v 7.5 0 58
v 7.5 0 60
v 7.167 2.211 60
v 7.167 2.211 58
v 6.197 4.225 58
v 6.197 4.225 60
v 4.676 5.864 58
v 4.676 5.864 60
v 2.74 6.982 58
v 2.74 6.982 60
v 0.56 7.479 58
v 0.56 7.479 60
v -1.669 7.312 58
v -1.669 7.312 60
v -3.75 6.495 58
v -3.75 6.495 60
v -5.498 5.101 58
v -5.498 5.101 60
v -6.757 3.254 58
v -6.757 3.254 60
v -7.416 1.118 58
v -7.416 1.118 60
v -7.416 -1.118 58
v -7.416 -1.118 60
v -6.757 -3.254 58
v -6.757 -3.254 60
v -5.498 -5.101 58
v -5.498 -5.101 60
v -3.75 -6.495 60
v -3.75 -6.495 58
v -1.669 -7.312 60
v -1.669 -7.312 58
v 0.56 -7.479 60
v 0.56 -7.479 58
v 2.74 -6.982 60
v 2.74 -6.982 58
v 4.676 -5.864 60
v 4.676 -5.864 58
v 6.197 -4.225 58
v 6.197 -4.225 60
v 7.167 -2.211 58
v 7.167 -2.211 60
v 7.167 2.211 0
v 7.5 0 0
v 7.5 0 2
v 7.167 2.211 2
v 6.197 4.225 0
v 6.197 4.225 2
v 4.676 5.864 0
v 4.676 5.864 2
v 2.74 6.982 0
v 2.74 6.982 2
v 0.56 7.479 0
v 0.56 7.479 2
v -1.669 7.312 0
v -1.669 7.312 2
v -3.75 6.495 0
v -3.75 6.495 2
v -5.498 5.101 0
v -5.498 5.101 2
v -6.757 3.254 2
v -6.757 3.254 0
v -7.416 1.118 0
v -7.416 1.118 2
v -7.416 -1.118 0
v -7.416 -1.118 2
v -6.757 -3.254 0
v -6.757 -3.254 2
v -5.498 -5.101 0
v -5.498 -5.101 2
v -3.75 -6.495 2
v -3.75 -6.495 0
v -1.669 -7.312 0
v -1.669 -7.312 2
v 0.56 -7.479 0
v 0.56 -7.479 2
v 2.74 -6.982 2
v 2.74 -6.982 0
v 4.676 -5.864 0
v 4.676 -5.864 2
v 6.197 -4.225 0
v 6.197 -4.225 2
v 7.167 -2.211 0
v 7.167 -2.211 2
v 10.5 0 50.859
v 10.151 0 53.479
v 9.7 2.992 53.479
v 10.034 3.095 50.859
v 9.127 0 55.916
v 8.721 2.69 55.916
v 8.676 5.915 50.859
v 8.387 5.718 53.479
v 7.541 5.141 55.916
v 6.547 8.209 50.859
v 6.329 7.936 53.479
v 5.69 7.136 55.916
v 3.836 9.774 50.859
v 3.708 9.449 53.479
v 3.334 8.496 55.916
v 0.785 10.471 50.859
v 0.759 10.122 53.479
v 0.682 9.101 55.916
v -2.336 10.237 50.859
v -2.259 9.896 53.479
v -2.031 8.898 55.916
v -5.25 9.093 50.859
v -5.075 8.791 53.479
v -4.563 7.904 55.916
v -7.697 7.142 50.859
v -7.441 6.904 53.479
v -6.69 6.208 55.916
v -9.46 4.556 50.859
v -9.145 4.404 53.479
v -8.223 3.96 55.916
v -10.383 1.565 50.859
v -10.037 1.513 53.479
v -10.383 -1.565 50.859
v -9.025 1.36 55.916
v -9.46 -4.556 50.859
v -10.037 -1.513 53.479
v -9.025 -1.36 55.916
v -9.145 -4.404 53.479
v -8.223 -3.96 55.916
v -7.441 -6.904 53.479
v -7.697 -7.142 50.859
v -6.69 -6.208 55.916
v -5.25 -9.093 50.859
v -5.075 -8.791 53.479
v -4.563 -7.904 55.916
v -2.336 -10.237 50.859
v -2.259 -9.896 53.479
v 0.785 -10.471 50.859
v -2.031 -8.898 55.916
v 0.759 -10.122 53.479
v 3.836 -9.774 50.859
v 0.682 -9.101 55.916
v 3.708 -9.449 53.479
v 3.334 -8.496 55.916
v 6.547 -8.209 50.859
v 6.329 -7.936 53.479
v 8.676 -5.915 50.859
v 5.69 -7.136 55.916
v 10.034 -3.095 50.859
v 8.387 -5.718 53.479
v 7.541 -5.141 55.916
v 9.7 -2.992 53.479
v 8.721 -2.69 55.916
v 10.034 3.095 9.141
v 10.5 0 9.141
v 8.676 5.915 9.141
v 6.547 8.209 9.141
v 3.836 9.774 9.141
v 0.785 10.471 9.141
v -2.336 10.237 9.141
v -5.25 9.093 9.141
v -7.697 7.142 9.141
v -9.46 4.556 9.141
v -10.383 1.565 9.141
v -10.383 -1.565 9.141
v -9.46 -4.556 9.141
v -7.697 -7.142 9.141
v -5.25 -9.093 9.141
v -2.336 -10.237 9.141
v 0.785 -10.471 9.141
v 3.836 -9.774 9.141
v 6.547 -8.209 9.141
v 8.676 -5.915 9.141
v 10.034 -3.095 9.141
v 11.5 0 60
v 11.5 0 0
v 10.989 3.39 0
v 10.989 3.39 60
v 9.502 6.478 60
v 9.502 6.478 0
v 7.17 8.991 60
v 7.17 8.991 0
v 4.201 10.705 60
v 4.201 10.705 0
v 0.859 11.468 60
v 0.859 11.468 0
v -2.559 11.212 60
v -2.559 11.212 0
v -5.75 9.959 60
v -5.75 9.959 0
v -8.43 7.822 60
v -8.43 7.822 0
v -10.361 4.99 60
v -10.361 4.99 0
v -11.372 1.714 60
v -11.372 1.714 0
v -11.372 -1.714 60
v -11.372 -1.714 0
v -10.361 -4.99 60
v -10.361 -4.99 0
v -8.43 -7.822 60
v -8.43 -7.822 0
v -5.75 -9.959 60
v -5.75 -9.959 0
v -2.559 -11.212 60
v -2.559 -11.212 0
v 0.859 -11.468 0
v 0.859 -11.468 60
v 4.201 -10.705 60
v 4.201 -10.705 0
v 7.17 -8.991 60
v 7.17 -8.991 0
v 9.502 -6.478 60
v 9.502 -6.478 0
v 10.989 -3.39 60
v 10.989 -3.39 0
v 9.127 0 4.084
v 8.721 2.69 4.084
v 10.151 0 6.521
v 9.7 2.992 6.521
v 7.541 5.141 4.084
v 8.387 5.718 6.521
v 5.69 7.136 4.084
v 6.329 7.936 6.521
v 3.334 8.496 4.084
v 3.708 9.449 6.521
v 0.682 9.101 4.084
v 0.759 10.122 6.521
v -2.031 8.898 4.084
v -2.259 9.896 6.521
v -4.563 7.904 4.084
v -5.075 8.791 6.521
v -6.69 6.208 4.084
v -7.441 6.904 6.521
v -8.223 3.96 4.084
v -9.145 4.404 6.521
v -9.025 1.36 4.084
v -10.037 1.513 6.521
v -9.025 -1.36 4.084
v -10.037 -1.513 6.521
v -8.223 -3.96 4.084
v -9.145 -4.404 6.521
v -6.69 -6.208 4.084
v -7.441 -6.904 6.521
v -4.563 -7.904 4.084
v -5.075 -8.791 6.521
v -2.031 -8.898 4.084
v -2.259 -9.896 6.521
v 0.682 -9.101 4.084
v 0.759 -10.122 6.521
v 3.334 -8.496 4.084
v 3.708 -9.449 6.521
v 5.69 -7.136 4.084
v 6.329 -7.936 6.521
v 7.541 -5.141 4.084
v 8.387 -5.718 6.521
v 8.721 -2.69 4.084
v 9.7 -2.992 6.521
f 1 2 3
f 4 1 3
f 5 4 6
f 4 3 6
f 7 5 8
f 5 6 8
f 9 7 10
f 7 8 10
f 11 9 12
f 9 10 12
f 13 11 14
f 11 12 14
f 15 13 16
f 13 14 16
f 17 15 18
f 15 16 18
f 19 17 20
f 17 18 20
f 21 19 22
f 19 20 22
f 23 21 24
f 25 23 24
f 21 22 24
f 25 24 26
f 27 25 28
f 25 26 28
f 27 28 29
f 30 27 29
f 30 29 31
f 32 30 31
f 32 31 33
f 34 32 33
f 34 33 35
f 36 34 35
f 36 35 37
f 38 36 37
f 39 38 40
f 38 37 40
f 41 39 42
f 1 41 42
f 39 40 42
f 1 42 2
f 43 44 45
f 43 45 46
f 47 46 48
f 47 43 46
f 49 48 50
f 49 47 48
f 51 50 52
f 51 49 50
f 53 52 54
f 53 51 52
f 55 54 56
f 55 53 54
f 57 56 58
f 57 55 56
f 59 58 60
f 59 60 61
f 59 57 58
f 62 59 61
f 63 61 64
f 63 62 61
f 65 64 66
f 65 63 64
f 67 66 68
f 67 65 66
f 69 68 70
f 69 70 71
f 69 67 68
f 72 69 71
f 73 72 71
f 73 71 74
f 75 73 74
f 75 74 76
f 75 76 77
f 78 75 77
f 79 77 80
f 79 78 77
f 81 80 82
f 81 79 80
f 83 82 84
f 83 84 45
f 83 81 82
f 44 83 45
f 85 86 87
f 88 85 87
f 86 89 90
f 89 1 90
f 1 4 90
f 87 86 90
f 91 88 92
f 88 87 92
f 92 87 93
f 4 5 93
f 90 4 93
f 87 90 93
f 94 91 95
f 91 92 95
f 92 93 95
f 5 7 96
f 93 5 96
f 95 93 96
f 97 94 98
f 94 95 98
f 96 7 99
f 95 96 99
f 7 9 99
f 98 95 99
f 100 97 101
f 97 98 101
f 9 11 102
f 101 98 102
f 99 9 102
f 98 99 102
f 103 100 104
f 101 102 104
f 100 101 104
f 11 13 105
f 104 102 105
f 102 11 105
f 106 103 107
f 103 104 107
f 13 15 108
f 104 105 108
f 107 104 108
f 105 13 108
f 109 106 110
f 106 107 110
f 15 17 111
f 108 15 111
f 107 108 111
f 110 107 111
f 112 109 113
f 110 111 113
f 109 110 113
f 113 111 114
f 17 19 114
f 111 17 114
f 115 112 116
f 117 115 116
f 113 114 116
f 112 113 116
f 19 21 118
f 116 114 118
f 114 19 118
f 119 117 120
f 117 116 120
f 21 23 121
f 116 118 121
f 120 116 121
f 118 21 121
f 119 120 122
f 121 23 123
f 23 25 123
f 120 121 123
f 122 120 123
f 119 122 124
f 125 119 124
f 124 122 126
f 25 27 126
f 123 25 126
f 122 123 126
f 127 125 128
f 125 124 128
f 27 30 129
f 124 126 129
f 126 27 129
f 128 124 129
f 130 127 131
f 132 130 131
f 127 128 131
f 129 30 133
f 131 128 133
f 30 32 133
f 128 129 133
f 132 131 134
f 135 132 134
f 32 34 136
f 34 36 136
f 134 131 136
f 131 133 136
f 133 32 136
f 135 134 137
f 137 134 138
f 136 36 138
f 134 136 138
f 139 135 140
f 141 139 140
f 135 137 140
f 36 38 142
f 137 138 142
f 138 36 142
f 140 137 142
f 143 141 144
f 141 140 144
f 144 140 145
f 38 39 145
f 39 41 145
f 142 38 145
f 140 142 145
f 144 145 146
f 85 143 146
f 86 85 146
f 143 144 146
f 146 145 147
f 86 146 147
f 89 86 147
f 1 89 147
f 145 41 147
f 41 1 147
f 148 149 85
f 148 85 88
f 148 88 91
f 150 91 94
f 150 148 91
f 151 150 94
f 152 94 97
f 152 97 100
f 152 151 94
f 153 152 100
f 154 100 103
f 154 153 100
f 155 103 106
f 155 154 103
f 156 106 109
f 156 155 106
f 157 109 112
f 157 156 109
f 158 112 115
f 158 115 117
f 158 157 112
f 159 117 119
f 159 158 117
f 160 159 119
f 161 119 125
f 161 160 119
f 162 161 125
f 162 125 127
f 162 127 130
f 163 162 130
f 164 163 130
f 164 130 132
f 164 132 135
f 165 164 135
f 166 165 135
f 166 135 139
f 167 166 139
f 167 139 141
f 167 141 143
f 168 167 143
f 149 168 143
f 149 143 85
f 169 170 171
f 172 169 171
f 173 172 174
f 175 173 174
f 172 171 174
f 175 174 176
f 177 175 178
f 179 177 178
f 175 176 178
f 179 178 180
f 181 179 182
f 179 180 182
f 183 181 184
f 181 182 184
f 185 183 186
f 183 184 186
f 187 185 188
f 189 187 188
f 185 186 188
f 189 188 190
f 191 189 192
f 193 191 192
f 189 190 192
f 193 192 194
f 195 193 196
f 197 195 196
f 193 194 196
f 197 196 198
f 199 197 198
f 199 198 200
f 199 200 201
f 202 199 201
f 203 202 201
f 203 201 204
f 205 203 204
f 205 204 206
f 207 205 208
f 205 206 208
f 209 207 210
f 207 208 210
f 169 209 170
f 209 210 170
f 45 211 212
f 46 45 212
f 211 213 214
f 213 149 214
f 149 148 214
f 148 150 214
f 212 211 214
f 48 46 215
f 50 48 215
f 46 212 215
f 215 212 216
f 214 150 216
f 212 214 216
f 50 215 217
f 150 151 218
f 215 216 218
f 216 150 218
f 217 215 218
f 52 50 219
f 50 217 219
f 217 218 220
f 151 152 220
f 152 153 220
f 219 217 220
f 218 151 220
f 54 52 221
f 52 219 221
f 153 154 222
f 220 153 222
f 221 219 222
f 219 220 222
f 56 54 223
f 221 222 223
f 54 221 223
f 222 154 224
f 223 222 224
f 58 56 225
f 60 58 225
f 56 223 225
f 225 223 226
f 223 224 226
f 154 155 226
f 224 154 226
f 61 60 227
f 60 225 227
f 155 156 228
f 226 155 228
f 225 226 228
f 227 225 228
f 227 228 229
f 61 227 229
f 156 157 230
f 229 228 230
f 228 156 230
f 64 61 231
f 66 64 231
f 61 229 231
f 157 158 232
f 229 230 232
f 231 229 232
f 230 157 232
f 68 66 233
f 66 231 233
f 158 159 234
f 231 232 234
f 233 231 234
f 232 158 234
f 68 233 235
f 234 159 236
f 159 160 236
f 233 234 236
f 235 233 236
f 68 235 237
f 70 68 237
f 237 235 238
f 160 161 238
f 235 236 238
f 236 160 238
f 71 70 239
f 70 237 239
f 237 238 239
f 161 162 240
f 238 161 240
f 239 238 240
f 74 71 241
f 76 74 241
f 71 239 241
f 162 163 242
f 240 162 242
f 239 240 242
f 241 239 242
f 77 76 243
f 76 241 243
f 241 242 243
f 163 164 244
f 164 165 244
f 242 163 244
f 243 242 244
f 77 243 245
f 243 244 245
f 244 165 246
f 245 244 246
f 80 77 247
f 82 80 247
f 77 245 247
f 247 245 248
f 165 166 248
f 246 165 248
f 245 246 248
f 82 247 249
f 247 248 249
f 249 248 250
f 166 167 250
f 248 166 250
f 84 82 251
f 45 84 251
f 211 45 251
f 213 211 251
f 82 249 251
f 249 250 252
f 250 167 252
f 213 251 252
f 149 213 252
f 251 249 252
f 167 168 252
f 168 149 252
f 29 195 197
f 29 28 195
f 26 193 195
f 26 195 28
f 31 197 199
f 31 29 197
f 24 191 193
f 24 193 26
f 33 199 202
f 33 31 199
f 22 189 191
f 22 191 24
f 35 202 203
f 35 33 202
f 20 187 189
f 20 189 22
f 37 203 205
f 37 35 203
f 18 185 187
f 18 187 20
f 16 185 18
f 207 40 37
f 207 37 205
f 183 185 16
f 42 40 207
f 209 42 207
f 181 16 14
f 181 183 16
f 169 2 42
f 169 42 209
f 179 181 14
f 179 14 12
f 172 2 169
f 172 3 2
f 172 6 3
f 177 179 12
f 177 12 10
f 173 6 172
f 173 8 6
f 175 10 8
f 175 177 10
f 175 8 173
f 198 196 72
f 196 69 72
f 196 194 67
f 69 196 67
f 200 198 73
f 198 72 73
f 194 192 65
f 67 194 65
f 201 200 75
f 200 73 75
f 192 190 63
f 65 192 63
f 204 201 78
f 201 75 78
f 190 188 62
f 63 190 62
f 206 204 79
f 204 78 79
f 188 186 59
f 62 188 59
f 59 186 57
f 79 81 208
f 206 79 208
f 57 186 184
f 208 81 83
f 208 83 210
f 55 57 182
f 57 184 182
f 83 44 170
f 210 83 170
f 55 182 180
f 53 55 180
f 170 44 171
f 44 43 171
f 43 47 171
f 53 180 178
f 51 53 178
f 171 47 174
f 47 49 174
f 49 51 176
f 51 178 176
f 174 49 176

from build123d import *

# Parameters (mm, degrees)
SKETCH1_R           = 11.5
SKETCH1_R_2         = 10.5
BOSS_EXTRUDE1_DEPTH = 60
SKETCH1_3_R         = 10.5
SKETCH1_3_R_2       = 7.5
BOSS_EXTRUDE2_DEPTH = 2
FILLET2_R           = 10


with BuildPart() as part:
    # Sketch1 → Boss-Extrude1 (new body)
    with BuildSketch(Plane.XY):
        Circle(SKETCH1_R)
        Circle(SKETCH1_R_2, mode=Mode.SUBTRACT)
    extrude(amount=BOSS_EXTRUDE1_DEPTH)

    # Sketch1<3> → Boss-Extrude2 (add)
    with BuildSketch(Plane.XY):
        Circle(SKETCH1_3_R)
        Circle(SKETCH1_3_R_2, mode=Mode.SUBTRACT)
    boss_extrude2 = extrude(amount=BOSS_EXTRUDE2_DEPTH)

    # Mirror1: Boss-Extrude2 across plane
    add(boss_extrude2.mirror(Plane.XY.offset(30)))

    # Fillet2
    # the kernel refuses this fillet: 10 mm, written as the material it adds along each edge
    with BuildSketch(Plane(origin=(0, 0, 58), x_dir=(1, 0, 0), z_dir=(0, -1, 0))) as fillet2_piece_1:
        with BuildLine():
            CenterArc((0.5, -7.141428429), FILLET2_R, 0, 45.572995999)
            Line((7.5, 0), (7.64, 0.142828569))
            ThreePointArc((7.64, 0.142828569), (9, 0.2), (10.5, 0.2))
            Line((10.5, 0.2), (10.7, 0))
            Line((10.7, 0), (10.7, -7.141428429))
            Line((10.7, -7.141428429), (10.5, -7.141428429))
        make_face()
    revolve(axis=Axis((0, 0, 58), (0, 0, 1)))
    with BuildSketch(Plane(origin=(0, 0, 2), x_dir=(1, 0, 0), z_dir=(0, -1, 0))) as fillet2_piece_2:
        with BuildLine():
            CenterArc((0.5, 7.141428429), FILLET2_R, 314.427004001, 45.572995999)
            Line((10.5, 7.141428429), (10.7, 7.141428429))
            Line((10.7, 7.141428429), (10.7, 0))
            Line((10.7, 0), (10.5, -0.2))
            ThreePointArc((10.5, -0.2), (9, -0.2), (7.64, -0.142828569))
            Line((7.64, -0.142828569), (7.5, 0))
        make_face()
    revolve(axis=Axis((0, 0, 2), (0, 0, 1)))


solid = part.part
